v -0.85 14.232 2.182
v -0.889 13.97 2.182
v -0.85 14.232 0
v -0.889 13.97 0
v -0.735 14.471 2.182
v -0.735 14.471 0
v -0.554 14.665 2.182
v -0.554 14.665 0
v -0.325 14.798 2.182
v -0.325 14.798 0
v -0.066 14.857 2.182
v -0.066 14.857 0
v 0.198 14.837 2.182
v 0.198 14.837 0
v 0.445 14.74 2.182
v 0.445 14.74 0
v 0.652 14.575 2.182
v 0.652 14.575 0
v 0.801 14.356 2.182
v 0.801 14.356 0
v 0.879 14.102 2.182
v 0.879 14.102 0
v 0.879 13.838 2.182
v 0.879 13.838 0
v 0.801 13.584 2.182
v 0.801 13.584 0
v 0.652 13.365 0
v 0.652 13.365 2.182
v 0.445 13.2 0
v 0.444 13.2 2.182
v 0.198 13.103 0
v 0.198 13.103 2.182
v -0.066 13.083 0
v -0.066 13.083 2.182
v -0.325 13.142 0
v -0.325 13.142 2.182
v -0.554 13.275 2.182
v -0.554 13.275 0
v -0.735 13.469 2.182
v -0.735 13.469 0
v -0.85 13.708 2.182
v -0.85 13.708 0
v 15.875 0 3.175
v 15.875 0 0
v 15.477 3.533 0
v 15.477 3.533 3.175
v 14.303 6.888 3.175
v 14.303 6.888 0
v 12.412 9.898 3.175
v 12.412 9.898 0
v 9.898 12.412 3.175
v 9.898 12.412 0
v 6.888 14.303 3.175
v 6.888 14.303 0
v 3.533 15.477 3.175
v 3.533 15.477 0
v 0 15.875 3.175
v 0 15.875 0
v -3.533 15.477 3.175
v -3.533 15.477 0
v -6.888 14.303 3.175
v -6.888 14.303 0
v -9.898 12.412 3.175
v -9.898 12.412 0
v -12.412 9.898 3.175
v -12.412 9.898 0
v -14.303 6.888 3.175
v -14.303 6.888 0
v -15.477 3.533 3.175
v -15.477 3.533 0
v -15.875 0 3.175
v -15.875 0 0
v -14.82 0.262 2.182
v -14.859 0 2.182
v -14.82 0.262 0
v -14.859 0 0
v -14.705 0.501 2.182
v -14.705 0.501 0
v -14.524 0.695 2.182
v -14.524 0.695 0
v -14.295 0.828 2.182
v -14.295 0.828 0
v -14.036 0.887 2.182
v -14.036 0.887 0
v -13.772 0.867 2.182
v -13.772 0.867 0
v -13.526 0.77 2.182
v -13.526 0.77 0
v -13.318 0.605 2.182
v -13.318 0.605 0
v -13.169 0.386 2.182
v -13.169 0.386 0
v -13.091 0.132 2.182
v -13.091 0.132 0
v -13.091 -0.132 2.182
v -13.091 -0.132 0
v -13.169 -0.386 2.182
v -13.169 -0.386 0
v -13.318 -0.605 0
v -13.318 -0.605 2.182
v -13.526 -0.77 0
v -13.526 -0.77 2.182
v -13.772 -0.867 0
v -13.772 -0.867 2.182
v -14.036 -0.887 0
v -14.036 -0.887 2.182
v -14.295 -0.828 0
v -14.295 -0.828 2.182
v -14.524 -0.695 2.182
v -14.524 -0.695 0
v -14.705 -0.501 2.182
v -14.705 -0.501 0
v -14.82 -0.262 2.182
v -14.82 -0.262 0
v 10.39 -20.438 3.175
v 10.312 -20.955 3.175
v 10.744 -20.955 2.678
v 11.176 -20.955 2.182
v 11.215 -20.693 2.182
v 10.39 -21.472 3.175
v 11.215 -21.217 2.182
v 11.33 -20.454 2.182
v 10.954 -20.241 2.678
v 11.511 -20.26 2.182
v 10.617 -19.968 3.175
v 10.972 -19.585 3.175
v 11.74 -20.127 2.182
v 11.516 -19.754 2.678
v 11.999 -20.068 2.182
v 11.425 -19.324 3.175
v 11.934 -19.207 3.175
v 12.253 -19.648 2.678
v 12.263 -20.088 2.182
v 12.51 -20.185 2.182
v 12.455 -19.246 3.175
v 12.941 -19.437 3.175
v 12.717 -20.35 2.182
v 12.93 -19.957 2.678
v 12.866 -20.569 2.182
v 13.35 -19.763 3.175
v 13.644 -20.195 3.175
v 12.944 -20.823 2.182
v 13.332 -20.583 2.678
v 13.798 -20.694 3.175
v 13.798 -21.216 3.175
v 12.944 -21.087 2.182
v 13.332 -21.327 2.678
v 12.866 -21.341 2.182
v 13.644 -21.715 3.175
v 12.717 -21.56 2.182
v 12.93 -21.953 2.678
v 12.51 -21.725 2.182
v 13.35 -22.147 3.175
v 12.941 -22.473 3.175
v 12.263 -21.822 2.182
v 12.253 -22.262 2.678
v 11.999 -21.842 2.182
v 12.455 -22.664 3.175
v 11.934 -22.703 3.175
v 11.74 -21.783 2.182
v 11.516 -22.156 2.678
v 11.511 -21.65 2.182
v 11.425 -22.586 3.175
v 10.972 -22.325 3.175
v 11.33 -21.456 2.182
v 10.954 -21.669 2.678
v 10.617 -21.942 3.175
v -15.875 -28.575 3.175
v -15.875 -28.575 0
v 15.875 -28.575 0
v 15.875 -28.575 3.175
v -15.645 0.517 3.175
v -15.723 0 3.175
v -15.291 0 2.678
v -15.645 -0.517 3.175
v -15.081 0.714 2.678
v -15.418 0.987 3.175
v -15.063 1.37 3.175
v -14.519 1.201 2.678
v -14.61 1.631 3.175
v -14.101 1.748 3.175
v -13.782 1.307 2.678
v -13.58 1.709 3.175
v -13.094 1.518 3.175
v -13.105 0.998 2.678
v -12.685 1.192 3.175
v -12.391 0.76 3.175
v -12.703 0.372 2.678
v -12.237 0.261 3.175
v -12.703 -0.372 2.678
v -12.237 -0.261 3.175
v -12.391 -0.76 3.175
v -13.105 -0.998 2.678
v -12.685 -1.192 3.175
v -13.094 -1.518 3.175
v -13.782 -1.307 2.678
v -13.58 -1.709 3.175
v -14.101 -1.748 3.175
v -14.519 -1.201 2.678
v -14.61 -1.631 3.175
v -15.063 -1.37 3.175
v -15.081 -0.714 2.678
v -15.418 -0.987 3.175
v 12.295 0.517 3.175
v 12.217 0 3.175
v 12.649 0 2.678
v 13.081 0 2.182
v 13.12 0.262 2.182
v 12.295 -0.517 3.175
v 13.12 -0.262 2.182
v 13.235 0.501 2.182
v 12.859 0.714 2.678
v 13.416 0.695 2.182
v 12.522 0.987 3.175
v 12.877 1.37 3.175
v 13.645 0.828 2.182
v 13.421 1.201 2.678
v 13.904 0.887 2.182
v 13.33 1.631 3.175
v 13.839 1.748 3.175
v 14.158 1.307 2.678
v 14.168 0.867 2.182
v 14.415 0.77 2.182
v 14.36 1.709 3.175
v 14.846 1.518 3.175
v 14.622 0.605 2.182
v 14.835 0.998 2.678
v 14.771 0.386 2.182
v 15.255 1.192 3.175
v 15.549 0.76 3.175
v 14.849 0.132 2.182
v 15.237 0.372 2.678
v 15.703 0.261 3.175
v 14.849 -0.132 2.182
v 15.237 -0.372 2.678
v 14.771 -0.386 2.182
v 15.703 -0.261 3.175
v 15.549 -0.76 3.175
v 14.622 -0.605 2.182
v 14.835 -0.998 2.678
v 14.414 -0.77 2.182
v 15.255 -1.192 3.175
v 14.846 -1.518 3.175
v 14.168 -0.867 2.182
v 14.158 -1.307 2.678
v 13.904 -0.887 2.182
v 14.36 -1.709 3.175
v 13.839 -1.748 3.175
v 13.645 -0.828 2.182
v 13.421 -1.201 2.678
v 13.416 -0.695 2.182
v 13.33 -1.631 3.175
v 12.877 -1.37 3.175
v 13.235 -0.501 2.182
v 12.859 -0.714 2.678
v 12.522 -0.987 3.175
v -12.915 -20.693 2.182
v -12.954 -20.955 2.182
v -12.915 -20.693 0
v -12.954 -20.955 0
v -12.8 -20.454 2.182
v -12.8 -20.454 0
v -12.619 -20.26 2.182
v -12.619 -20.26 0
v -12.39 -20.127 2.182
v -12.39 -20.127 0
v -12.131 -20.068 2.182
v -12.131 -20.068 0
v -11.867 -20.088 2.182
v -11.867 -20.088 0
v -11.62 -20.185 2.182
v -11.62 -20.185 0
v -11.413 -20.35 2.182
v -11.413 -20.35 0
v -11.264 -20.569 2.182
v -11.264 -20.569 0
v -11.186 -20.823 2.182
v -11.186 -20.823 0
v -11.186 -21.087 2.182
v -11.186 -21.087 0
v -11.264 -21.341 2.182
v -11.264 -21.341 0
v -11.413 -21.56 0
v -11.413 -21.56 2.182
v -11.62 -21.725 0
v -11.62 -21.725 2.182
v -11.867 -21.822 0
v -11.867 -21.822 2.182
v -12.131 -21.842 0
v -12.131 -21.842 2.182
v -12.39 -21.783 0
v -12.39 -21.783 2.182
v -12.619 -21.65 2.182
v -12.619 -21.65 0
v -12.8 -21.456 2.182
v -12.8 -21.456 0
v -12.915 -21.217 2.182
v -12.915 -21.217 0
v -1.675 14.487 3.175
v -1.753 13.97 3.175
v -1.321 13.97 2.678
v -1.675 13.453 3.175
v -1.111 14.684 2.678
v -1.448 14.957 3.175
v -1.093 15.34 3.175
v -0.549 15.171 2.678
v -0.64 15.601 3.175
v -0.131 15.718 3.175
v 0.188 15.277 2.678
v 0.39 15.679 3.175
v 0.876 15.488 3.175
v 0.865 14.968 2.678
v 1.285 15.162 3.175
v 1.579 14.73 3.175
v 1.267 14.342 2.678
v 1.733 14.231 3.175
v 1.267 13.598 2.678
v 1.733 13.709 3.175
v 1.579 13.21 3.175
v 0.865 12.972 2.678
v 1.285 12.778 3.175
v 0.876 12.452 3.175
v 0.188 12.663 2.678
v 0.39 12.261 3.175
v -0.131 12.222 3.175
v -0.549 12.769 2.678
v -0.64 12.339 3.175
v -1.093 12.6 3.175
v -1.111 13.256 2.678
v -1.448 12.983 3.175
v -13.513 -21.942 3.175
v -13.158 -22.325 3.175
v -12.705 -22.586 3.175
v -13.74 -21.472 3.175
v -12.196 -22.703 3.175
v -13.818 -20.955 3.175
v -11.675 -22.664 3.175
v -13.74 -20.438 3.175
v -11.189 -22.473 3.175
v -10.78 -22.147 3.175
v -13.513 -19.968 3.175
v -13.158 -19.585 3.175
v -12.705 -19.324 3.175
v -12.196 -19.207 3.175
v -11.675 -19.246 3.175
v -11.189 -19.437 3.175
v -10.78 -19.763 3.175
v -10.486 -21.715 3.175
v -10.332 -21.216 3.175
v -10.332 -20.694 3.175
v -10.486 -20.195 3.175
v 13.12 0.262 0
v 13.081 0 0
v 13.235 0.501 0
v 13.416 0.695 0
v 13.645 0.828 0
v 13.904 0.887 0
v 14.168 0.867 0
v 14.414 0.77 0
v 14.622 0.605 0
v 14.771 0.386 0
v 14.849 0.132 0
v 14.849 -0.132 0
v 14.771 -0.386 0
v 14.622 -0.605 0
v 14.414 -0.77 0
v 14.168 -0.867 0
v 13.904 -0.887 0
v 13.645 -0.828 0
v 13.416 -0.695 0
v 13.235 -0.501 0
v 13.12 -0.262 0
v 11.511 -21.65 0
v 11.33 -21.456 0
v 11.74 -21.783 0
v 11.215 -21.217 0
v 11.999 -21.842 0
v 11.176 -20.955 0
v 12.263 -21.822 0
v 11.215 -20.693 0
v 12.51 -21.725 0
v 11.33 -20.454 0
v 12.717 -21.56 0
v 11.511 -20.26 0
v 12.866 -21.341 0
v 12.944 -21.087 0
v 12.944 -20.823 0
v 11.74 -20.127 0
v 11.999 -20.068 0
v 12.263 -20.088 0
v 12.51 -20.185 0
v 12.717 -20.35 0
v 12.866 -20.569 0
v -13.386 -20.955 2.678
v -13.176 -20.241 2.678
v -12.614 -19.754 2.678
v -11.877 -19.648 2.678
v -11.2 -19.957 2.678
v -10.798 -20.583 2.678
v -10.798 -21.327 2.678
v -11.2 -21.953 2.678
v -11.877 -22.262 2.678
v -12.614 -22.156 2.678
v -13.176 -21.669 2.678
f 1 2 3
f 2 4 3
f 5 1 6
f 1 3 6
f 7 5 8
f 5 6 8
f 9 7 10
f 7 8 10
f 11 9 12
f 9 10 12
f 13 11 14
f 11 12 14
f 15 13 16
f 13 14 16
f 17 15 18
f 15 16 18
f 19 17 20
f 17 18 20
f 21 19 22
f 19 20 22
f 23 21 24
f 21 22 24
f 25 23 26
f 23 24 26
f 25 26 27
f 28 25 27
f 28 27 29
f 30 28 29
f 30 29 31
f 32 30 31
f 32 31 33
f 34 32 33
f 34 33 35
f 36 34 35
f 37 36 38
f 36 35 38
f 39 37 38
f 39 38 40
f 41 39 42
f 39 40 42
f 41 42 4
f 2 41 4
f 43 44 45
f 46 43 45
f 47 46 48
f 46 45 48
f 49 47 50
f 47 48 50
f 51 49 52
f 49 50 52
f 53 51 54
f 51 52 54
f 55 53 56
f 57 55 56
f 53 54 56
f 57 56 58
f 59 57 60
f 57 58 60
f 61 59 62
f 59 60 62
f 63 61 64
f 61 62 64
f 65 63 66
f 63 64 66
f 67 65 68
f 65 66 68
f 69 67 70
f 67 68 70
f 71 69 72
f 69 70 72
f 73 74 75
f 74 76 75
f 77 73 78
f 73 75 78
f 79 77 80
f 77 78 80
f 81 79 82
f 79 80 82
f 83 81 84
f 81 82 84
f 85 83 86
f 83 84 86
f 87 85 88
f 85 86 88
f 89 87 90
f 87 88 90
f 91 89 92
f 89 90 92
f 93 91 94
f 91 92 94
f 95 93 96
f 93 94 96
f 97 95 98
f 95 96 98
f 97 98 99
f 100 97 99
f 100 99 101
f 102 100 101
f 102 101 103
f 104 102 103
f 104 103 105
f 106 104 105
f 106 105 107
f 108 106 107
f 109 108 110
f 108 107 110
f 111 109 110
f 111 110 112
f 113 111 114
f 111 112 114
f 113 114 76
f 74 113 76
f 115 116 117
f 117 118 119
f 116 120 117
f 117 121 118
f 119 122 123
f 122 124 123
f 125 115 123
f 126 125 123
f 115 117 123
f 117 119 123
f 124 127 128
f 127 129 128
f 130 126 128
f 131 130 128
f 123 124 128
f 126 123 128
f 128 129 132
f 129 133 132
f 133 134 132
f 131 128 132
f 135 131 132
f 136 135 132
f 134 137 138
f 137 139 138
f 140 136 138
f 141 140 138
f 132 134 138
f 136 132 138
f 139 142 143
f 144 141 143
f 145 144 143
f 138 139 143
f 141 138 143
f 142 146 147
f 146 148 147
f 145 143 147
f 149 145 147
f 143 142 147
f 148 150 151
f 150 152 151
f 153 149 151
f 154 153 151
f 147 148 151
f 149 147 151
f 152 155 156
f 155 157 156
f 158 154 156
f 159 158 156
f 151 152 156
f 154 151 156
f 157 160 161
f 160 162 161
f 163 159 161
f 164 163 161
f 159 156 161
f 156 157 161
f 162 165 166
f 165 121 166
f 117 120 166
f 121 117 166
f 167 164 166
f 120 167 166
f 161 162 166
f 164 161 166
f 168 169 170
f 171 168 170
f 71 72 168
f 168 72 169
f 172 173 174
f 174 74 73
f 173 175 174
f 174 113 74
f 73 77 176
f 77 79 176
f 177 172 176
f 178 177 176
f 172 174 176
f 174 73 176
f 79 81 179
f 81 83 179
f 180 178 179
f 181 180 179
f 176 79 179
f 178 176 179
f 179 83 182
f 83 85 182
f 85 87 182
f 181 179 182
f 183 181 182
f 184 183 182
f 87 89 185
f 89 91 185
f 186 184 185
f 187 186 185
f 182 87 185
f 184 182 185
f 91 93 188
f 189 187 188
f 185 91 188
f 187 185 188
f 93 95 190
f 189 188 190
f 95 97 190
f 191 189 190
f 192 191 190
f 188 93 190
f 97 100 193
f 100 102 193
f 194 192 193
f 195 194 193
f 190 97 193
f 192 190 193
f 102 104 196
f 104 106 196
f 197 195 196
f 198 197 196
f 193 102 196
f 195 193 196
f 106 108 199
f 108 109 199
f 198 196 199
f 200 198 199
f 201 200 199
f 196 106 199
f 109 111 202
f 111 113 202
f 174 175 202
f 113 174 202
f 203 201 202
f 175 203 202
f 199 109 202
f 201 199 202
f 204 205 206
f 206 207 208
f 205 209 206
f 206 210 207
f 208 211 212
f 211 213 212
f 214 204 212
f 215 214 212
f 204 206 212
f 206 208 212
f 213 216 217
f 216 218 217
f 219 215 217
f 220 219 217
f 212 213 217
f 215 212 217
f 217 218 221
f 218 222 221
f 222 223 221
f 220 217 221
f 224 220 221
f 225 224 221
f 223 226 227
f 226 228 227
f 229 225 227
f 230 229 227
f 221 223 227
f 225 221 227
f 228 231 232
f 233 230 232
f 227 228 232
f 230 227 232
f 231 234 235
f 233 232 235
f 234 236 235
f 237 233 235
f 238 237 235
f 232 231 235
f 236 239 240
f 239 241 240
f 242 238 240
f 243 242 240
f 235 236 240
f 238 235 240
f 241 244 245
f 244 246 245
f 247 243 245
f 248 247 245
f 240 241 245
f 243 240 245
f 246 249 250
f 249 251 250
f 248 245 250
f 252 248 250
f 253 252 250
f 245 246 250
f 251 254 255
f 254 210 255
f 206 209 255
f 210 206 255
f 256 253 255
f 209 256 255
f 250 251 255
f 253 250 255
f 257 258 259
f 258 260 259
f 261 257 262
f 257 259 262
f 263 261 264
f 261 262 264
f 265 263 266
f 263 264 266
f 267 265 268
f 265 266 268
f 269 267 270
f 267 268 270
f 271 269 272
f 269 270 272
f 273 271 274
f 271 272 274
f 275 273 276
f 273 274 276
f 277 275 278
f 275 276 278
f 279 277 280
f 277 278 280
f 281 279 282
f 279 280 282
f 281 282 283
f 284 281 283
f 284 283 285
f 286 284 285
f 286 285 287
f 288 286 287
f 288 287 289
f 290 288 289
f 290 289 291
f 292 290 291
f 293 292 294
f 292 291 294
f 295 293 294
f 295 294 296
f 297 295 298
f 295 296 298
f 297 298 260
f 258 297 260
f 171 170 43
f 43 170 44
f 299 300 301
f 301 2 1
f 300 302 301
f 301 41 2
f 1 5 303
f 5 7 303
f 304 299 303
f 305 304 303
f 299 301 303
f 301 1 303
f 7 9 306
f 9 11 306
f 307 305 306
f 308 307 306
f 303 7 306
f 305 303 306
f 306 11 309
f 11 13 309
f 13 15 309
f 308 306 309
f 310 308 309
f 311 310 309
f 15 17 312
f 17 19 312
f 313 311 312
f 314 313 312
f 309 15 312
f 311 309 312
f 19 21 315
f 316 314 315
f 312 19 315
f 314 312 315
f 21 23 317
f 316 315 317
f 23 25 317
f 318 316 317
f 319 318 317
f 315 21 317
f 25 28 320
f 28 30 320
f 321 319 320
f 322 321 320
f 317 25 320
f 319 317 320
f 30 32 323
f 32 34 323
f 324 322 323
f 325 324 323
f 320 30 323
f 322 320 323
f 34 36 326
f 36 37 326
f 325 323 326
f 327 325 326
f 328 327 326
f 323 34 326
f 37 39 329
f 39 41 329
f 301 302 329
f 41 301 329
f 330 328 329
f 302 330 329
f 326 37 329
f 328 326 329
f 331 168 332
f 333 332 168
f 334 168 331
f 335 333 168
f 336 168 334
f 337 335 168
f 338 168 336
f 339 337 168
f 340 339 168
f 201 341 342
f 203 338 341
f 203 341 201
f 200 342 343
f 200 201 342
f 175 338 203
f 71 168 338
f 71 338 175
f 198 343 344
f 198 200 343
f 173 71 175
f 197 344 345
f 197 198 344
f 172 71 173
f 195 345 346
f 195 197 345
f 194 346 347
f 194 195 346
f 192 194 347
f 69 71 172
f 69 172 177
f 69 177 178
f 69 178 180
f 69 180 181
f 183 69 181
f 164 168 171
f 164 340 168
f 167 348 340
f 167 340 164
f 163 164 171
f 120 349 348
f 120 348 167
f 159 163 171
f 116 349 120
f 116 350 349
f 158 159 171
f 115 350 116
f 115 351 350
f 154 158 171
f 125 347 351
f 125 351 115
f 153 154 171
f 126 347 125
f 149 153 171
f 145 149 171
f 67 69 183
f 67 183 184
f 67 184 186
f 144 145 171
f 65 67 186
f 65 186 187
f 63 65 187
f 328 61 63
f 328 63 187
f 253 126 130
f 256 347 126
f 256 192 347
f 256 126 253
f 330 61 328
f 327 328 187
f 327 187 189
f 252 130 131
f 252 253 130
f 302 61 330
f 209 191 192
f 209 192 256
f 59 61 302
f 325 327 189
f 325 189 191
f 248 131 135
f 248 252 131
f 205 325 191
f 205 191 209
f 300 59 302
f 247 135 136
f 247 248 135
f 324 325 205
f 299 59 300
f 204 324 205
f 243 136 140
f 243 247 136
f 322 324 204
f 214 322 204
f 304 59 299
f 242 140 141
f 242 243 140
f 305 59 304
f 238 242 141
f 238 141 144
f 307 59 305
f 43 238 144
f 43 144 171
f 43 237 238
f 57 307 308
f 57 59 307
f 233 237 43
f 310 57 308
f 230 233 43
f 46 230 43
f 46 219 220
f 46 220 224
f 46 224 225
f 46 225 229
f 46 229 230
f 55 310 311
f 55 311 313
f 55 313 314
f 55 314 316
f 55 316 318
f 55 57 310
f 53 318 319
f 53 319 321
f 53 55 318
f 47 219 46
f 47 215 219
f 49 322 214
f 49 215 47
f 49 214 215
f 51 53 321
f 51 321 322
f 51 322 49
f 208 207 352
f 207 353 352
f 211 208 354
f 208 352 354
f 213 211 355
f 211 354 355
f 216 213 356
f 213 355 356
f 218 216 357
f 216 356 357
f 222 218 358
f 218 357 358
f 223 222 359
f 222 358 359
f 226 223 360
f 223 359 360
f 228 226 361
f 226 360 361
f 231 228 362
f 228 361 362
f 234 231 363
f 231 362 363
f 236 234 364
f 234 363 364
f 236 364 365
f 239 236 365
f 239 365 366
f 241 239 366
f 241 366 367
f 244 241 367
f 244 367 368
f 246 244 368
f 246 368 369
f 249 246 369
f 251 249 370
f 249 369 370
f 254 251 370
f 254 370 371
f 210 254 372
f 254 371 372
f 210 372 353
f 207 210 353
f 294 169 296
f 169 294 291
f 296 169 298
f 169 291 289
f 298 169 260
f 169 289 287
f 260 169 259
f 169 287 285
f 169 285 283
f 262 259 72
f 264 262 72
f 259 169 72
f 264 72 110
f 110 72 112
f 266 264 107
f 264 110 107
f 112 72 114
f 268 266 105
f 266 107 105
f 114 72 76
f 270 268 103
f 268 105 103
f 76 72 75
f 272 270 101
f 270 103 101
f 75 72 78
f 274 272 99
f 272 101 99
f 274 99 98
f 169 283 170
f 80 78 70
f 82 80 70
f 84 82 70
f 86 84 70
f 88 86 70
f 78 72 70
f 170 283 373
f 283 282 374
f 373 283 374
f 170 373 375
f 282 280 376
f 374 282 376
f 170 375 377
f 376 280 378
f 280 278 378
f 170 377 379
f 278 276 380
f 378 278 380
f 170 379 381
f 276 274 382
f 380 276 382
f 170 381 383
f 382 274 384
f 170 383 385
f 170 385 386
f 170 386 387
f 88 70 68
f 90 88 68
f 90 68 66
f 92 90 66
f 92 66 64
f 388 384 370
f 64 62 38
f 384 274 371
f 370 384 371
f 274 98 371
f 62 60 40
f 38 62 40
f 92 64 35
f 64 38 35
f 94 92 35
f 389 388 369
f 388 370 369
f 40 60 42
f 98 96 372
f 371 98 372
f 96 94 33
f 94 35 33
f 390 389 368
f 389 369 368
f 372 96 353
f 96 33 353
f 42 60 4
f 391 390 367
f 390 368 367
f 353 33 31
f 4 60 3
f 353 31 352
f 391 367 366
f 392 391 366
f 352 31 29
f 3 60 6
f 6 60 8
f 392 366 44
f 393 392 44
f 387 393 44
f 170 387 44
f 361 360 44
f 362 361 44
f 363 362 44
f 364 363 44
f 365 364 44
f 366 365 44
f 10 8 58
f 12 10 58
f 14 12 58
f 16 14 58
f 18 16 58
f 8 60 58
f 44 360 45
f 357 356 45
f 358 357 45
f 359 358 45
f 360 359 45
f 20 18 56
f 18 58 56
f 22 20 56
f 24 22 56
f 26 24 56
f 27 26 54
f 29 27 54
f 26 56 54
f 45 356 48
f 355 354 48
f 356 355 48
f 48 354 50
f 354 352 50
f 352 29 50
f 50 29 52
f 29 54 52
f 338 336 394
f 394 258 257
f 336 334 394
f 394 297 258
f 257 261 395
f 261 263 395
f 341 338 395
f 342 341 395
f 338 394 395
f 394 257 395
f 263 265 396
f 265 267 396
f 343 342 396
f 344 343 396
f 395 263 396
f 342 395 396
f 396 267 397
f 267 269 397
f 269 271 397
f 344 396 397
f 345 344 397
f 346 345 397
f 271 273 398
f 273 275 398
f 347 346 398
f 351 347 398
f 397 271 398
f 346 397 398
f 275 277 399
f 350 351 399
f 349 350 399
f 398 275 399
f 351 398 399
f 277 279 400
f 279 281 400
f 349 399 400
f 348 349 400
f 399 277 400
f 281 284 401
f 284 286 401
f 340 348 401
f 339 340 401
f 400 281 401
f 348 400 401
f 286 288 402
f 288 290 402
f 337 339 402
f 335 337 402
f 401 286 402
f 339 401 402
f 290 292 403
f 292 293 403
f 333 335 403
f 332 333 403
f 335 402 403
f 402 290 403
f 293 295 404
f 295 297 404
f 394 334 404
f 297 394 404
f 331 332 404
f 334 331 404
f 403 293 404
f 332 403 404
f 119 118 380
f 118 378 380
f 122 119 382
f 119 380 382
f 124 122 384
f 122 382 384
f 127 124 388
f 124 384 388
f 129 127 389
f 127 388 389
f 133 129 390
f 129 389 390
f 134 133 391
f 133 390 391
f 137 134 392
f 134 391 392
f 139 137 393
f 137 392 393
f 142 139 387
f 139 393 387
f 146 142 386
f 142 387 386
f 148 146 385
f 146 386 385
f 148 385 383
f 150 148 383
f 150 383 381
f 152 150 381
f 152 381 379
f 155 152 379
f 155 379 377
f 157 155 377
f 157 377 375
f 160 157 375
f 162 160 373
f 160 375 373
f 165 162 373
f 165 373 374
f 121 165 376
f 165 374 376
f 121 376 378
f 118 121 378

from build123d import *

# Parameters (mm, degrees)
BOSS_EXTRUDE1_DEPTH                               = 3.175
CSK_FOR_0_FLAT_HEAD_SOCKET_CAP_SCREW1_D           = 1.778
CSK_FOR_0_FLAT_HEAD_SOCKET_CAP_SCREW1_CSINK_D     = 3.5052
CSK_FOR_0_FLAT_HEAD_SOCKET_CAP_SCREW1_CSINK_ANGLE = 82


with BuildPart() as part:
    # Sketch1 → Boss-Extrude1 (new body)
    with BuildSketch(Plane.XY):
        with BuildLine():
            Line((-15.875, 0), (-15.875, -28.575))
            Line((-15.875, -28.575), (15.875, -28.575))
            Line((15.875, -28.575), (15.875, 0))
            ThreePointArc((15.875, 0), (0, 15.875), (-15.875, 0))
        make_face()
    extrude(amount=BOSS_EXTRUDE1_DEPTH)

    # CSK for #0 Flat Head Socket Cap Screw1 (through all)
    with Locations(Plane.XY.offset(3.175)):
        with Locations((0, 13.97), (-13.97, 0), (13.97, 0), (-12.065, -20.955), (12.065, -20.955)):
            CounterSinkHole(CSK_FOR_0_FLAT_HEAD_SOCKET_CAP_SCREW1_D / 2, CSK_FOR_0_FLAT_HEAD_SOCKET_CAP_SCREW1_CSINK_D / 2, counter_sink_angle=CSK_FOR_0_FLAT_HEAD_SOCKET_CAP_SCREW1_CSINK_ANGLE)


solid = part.part
